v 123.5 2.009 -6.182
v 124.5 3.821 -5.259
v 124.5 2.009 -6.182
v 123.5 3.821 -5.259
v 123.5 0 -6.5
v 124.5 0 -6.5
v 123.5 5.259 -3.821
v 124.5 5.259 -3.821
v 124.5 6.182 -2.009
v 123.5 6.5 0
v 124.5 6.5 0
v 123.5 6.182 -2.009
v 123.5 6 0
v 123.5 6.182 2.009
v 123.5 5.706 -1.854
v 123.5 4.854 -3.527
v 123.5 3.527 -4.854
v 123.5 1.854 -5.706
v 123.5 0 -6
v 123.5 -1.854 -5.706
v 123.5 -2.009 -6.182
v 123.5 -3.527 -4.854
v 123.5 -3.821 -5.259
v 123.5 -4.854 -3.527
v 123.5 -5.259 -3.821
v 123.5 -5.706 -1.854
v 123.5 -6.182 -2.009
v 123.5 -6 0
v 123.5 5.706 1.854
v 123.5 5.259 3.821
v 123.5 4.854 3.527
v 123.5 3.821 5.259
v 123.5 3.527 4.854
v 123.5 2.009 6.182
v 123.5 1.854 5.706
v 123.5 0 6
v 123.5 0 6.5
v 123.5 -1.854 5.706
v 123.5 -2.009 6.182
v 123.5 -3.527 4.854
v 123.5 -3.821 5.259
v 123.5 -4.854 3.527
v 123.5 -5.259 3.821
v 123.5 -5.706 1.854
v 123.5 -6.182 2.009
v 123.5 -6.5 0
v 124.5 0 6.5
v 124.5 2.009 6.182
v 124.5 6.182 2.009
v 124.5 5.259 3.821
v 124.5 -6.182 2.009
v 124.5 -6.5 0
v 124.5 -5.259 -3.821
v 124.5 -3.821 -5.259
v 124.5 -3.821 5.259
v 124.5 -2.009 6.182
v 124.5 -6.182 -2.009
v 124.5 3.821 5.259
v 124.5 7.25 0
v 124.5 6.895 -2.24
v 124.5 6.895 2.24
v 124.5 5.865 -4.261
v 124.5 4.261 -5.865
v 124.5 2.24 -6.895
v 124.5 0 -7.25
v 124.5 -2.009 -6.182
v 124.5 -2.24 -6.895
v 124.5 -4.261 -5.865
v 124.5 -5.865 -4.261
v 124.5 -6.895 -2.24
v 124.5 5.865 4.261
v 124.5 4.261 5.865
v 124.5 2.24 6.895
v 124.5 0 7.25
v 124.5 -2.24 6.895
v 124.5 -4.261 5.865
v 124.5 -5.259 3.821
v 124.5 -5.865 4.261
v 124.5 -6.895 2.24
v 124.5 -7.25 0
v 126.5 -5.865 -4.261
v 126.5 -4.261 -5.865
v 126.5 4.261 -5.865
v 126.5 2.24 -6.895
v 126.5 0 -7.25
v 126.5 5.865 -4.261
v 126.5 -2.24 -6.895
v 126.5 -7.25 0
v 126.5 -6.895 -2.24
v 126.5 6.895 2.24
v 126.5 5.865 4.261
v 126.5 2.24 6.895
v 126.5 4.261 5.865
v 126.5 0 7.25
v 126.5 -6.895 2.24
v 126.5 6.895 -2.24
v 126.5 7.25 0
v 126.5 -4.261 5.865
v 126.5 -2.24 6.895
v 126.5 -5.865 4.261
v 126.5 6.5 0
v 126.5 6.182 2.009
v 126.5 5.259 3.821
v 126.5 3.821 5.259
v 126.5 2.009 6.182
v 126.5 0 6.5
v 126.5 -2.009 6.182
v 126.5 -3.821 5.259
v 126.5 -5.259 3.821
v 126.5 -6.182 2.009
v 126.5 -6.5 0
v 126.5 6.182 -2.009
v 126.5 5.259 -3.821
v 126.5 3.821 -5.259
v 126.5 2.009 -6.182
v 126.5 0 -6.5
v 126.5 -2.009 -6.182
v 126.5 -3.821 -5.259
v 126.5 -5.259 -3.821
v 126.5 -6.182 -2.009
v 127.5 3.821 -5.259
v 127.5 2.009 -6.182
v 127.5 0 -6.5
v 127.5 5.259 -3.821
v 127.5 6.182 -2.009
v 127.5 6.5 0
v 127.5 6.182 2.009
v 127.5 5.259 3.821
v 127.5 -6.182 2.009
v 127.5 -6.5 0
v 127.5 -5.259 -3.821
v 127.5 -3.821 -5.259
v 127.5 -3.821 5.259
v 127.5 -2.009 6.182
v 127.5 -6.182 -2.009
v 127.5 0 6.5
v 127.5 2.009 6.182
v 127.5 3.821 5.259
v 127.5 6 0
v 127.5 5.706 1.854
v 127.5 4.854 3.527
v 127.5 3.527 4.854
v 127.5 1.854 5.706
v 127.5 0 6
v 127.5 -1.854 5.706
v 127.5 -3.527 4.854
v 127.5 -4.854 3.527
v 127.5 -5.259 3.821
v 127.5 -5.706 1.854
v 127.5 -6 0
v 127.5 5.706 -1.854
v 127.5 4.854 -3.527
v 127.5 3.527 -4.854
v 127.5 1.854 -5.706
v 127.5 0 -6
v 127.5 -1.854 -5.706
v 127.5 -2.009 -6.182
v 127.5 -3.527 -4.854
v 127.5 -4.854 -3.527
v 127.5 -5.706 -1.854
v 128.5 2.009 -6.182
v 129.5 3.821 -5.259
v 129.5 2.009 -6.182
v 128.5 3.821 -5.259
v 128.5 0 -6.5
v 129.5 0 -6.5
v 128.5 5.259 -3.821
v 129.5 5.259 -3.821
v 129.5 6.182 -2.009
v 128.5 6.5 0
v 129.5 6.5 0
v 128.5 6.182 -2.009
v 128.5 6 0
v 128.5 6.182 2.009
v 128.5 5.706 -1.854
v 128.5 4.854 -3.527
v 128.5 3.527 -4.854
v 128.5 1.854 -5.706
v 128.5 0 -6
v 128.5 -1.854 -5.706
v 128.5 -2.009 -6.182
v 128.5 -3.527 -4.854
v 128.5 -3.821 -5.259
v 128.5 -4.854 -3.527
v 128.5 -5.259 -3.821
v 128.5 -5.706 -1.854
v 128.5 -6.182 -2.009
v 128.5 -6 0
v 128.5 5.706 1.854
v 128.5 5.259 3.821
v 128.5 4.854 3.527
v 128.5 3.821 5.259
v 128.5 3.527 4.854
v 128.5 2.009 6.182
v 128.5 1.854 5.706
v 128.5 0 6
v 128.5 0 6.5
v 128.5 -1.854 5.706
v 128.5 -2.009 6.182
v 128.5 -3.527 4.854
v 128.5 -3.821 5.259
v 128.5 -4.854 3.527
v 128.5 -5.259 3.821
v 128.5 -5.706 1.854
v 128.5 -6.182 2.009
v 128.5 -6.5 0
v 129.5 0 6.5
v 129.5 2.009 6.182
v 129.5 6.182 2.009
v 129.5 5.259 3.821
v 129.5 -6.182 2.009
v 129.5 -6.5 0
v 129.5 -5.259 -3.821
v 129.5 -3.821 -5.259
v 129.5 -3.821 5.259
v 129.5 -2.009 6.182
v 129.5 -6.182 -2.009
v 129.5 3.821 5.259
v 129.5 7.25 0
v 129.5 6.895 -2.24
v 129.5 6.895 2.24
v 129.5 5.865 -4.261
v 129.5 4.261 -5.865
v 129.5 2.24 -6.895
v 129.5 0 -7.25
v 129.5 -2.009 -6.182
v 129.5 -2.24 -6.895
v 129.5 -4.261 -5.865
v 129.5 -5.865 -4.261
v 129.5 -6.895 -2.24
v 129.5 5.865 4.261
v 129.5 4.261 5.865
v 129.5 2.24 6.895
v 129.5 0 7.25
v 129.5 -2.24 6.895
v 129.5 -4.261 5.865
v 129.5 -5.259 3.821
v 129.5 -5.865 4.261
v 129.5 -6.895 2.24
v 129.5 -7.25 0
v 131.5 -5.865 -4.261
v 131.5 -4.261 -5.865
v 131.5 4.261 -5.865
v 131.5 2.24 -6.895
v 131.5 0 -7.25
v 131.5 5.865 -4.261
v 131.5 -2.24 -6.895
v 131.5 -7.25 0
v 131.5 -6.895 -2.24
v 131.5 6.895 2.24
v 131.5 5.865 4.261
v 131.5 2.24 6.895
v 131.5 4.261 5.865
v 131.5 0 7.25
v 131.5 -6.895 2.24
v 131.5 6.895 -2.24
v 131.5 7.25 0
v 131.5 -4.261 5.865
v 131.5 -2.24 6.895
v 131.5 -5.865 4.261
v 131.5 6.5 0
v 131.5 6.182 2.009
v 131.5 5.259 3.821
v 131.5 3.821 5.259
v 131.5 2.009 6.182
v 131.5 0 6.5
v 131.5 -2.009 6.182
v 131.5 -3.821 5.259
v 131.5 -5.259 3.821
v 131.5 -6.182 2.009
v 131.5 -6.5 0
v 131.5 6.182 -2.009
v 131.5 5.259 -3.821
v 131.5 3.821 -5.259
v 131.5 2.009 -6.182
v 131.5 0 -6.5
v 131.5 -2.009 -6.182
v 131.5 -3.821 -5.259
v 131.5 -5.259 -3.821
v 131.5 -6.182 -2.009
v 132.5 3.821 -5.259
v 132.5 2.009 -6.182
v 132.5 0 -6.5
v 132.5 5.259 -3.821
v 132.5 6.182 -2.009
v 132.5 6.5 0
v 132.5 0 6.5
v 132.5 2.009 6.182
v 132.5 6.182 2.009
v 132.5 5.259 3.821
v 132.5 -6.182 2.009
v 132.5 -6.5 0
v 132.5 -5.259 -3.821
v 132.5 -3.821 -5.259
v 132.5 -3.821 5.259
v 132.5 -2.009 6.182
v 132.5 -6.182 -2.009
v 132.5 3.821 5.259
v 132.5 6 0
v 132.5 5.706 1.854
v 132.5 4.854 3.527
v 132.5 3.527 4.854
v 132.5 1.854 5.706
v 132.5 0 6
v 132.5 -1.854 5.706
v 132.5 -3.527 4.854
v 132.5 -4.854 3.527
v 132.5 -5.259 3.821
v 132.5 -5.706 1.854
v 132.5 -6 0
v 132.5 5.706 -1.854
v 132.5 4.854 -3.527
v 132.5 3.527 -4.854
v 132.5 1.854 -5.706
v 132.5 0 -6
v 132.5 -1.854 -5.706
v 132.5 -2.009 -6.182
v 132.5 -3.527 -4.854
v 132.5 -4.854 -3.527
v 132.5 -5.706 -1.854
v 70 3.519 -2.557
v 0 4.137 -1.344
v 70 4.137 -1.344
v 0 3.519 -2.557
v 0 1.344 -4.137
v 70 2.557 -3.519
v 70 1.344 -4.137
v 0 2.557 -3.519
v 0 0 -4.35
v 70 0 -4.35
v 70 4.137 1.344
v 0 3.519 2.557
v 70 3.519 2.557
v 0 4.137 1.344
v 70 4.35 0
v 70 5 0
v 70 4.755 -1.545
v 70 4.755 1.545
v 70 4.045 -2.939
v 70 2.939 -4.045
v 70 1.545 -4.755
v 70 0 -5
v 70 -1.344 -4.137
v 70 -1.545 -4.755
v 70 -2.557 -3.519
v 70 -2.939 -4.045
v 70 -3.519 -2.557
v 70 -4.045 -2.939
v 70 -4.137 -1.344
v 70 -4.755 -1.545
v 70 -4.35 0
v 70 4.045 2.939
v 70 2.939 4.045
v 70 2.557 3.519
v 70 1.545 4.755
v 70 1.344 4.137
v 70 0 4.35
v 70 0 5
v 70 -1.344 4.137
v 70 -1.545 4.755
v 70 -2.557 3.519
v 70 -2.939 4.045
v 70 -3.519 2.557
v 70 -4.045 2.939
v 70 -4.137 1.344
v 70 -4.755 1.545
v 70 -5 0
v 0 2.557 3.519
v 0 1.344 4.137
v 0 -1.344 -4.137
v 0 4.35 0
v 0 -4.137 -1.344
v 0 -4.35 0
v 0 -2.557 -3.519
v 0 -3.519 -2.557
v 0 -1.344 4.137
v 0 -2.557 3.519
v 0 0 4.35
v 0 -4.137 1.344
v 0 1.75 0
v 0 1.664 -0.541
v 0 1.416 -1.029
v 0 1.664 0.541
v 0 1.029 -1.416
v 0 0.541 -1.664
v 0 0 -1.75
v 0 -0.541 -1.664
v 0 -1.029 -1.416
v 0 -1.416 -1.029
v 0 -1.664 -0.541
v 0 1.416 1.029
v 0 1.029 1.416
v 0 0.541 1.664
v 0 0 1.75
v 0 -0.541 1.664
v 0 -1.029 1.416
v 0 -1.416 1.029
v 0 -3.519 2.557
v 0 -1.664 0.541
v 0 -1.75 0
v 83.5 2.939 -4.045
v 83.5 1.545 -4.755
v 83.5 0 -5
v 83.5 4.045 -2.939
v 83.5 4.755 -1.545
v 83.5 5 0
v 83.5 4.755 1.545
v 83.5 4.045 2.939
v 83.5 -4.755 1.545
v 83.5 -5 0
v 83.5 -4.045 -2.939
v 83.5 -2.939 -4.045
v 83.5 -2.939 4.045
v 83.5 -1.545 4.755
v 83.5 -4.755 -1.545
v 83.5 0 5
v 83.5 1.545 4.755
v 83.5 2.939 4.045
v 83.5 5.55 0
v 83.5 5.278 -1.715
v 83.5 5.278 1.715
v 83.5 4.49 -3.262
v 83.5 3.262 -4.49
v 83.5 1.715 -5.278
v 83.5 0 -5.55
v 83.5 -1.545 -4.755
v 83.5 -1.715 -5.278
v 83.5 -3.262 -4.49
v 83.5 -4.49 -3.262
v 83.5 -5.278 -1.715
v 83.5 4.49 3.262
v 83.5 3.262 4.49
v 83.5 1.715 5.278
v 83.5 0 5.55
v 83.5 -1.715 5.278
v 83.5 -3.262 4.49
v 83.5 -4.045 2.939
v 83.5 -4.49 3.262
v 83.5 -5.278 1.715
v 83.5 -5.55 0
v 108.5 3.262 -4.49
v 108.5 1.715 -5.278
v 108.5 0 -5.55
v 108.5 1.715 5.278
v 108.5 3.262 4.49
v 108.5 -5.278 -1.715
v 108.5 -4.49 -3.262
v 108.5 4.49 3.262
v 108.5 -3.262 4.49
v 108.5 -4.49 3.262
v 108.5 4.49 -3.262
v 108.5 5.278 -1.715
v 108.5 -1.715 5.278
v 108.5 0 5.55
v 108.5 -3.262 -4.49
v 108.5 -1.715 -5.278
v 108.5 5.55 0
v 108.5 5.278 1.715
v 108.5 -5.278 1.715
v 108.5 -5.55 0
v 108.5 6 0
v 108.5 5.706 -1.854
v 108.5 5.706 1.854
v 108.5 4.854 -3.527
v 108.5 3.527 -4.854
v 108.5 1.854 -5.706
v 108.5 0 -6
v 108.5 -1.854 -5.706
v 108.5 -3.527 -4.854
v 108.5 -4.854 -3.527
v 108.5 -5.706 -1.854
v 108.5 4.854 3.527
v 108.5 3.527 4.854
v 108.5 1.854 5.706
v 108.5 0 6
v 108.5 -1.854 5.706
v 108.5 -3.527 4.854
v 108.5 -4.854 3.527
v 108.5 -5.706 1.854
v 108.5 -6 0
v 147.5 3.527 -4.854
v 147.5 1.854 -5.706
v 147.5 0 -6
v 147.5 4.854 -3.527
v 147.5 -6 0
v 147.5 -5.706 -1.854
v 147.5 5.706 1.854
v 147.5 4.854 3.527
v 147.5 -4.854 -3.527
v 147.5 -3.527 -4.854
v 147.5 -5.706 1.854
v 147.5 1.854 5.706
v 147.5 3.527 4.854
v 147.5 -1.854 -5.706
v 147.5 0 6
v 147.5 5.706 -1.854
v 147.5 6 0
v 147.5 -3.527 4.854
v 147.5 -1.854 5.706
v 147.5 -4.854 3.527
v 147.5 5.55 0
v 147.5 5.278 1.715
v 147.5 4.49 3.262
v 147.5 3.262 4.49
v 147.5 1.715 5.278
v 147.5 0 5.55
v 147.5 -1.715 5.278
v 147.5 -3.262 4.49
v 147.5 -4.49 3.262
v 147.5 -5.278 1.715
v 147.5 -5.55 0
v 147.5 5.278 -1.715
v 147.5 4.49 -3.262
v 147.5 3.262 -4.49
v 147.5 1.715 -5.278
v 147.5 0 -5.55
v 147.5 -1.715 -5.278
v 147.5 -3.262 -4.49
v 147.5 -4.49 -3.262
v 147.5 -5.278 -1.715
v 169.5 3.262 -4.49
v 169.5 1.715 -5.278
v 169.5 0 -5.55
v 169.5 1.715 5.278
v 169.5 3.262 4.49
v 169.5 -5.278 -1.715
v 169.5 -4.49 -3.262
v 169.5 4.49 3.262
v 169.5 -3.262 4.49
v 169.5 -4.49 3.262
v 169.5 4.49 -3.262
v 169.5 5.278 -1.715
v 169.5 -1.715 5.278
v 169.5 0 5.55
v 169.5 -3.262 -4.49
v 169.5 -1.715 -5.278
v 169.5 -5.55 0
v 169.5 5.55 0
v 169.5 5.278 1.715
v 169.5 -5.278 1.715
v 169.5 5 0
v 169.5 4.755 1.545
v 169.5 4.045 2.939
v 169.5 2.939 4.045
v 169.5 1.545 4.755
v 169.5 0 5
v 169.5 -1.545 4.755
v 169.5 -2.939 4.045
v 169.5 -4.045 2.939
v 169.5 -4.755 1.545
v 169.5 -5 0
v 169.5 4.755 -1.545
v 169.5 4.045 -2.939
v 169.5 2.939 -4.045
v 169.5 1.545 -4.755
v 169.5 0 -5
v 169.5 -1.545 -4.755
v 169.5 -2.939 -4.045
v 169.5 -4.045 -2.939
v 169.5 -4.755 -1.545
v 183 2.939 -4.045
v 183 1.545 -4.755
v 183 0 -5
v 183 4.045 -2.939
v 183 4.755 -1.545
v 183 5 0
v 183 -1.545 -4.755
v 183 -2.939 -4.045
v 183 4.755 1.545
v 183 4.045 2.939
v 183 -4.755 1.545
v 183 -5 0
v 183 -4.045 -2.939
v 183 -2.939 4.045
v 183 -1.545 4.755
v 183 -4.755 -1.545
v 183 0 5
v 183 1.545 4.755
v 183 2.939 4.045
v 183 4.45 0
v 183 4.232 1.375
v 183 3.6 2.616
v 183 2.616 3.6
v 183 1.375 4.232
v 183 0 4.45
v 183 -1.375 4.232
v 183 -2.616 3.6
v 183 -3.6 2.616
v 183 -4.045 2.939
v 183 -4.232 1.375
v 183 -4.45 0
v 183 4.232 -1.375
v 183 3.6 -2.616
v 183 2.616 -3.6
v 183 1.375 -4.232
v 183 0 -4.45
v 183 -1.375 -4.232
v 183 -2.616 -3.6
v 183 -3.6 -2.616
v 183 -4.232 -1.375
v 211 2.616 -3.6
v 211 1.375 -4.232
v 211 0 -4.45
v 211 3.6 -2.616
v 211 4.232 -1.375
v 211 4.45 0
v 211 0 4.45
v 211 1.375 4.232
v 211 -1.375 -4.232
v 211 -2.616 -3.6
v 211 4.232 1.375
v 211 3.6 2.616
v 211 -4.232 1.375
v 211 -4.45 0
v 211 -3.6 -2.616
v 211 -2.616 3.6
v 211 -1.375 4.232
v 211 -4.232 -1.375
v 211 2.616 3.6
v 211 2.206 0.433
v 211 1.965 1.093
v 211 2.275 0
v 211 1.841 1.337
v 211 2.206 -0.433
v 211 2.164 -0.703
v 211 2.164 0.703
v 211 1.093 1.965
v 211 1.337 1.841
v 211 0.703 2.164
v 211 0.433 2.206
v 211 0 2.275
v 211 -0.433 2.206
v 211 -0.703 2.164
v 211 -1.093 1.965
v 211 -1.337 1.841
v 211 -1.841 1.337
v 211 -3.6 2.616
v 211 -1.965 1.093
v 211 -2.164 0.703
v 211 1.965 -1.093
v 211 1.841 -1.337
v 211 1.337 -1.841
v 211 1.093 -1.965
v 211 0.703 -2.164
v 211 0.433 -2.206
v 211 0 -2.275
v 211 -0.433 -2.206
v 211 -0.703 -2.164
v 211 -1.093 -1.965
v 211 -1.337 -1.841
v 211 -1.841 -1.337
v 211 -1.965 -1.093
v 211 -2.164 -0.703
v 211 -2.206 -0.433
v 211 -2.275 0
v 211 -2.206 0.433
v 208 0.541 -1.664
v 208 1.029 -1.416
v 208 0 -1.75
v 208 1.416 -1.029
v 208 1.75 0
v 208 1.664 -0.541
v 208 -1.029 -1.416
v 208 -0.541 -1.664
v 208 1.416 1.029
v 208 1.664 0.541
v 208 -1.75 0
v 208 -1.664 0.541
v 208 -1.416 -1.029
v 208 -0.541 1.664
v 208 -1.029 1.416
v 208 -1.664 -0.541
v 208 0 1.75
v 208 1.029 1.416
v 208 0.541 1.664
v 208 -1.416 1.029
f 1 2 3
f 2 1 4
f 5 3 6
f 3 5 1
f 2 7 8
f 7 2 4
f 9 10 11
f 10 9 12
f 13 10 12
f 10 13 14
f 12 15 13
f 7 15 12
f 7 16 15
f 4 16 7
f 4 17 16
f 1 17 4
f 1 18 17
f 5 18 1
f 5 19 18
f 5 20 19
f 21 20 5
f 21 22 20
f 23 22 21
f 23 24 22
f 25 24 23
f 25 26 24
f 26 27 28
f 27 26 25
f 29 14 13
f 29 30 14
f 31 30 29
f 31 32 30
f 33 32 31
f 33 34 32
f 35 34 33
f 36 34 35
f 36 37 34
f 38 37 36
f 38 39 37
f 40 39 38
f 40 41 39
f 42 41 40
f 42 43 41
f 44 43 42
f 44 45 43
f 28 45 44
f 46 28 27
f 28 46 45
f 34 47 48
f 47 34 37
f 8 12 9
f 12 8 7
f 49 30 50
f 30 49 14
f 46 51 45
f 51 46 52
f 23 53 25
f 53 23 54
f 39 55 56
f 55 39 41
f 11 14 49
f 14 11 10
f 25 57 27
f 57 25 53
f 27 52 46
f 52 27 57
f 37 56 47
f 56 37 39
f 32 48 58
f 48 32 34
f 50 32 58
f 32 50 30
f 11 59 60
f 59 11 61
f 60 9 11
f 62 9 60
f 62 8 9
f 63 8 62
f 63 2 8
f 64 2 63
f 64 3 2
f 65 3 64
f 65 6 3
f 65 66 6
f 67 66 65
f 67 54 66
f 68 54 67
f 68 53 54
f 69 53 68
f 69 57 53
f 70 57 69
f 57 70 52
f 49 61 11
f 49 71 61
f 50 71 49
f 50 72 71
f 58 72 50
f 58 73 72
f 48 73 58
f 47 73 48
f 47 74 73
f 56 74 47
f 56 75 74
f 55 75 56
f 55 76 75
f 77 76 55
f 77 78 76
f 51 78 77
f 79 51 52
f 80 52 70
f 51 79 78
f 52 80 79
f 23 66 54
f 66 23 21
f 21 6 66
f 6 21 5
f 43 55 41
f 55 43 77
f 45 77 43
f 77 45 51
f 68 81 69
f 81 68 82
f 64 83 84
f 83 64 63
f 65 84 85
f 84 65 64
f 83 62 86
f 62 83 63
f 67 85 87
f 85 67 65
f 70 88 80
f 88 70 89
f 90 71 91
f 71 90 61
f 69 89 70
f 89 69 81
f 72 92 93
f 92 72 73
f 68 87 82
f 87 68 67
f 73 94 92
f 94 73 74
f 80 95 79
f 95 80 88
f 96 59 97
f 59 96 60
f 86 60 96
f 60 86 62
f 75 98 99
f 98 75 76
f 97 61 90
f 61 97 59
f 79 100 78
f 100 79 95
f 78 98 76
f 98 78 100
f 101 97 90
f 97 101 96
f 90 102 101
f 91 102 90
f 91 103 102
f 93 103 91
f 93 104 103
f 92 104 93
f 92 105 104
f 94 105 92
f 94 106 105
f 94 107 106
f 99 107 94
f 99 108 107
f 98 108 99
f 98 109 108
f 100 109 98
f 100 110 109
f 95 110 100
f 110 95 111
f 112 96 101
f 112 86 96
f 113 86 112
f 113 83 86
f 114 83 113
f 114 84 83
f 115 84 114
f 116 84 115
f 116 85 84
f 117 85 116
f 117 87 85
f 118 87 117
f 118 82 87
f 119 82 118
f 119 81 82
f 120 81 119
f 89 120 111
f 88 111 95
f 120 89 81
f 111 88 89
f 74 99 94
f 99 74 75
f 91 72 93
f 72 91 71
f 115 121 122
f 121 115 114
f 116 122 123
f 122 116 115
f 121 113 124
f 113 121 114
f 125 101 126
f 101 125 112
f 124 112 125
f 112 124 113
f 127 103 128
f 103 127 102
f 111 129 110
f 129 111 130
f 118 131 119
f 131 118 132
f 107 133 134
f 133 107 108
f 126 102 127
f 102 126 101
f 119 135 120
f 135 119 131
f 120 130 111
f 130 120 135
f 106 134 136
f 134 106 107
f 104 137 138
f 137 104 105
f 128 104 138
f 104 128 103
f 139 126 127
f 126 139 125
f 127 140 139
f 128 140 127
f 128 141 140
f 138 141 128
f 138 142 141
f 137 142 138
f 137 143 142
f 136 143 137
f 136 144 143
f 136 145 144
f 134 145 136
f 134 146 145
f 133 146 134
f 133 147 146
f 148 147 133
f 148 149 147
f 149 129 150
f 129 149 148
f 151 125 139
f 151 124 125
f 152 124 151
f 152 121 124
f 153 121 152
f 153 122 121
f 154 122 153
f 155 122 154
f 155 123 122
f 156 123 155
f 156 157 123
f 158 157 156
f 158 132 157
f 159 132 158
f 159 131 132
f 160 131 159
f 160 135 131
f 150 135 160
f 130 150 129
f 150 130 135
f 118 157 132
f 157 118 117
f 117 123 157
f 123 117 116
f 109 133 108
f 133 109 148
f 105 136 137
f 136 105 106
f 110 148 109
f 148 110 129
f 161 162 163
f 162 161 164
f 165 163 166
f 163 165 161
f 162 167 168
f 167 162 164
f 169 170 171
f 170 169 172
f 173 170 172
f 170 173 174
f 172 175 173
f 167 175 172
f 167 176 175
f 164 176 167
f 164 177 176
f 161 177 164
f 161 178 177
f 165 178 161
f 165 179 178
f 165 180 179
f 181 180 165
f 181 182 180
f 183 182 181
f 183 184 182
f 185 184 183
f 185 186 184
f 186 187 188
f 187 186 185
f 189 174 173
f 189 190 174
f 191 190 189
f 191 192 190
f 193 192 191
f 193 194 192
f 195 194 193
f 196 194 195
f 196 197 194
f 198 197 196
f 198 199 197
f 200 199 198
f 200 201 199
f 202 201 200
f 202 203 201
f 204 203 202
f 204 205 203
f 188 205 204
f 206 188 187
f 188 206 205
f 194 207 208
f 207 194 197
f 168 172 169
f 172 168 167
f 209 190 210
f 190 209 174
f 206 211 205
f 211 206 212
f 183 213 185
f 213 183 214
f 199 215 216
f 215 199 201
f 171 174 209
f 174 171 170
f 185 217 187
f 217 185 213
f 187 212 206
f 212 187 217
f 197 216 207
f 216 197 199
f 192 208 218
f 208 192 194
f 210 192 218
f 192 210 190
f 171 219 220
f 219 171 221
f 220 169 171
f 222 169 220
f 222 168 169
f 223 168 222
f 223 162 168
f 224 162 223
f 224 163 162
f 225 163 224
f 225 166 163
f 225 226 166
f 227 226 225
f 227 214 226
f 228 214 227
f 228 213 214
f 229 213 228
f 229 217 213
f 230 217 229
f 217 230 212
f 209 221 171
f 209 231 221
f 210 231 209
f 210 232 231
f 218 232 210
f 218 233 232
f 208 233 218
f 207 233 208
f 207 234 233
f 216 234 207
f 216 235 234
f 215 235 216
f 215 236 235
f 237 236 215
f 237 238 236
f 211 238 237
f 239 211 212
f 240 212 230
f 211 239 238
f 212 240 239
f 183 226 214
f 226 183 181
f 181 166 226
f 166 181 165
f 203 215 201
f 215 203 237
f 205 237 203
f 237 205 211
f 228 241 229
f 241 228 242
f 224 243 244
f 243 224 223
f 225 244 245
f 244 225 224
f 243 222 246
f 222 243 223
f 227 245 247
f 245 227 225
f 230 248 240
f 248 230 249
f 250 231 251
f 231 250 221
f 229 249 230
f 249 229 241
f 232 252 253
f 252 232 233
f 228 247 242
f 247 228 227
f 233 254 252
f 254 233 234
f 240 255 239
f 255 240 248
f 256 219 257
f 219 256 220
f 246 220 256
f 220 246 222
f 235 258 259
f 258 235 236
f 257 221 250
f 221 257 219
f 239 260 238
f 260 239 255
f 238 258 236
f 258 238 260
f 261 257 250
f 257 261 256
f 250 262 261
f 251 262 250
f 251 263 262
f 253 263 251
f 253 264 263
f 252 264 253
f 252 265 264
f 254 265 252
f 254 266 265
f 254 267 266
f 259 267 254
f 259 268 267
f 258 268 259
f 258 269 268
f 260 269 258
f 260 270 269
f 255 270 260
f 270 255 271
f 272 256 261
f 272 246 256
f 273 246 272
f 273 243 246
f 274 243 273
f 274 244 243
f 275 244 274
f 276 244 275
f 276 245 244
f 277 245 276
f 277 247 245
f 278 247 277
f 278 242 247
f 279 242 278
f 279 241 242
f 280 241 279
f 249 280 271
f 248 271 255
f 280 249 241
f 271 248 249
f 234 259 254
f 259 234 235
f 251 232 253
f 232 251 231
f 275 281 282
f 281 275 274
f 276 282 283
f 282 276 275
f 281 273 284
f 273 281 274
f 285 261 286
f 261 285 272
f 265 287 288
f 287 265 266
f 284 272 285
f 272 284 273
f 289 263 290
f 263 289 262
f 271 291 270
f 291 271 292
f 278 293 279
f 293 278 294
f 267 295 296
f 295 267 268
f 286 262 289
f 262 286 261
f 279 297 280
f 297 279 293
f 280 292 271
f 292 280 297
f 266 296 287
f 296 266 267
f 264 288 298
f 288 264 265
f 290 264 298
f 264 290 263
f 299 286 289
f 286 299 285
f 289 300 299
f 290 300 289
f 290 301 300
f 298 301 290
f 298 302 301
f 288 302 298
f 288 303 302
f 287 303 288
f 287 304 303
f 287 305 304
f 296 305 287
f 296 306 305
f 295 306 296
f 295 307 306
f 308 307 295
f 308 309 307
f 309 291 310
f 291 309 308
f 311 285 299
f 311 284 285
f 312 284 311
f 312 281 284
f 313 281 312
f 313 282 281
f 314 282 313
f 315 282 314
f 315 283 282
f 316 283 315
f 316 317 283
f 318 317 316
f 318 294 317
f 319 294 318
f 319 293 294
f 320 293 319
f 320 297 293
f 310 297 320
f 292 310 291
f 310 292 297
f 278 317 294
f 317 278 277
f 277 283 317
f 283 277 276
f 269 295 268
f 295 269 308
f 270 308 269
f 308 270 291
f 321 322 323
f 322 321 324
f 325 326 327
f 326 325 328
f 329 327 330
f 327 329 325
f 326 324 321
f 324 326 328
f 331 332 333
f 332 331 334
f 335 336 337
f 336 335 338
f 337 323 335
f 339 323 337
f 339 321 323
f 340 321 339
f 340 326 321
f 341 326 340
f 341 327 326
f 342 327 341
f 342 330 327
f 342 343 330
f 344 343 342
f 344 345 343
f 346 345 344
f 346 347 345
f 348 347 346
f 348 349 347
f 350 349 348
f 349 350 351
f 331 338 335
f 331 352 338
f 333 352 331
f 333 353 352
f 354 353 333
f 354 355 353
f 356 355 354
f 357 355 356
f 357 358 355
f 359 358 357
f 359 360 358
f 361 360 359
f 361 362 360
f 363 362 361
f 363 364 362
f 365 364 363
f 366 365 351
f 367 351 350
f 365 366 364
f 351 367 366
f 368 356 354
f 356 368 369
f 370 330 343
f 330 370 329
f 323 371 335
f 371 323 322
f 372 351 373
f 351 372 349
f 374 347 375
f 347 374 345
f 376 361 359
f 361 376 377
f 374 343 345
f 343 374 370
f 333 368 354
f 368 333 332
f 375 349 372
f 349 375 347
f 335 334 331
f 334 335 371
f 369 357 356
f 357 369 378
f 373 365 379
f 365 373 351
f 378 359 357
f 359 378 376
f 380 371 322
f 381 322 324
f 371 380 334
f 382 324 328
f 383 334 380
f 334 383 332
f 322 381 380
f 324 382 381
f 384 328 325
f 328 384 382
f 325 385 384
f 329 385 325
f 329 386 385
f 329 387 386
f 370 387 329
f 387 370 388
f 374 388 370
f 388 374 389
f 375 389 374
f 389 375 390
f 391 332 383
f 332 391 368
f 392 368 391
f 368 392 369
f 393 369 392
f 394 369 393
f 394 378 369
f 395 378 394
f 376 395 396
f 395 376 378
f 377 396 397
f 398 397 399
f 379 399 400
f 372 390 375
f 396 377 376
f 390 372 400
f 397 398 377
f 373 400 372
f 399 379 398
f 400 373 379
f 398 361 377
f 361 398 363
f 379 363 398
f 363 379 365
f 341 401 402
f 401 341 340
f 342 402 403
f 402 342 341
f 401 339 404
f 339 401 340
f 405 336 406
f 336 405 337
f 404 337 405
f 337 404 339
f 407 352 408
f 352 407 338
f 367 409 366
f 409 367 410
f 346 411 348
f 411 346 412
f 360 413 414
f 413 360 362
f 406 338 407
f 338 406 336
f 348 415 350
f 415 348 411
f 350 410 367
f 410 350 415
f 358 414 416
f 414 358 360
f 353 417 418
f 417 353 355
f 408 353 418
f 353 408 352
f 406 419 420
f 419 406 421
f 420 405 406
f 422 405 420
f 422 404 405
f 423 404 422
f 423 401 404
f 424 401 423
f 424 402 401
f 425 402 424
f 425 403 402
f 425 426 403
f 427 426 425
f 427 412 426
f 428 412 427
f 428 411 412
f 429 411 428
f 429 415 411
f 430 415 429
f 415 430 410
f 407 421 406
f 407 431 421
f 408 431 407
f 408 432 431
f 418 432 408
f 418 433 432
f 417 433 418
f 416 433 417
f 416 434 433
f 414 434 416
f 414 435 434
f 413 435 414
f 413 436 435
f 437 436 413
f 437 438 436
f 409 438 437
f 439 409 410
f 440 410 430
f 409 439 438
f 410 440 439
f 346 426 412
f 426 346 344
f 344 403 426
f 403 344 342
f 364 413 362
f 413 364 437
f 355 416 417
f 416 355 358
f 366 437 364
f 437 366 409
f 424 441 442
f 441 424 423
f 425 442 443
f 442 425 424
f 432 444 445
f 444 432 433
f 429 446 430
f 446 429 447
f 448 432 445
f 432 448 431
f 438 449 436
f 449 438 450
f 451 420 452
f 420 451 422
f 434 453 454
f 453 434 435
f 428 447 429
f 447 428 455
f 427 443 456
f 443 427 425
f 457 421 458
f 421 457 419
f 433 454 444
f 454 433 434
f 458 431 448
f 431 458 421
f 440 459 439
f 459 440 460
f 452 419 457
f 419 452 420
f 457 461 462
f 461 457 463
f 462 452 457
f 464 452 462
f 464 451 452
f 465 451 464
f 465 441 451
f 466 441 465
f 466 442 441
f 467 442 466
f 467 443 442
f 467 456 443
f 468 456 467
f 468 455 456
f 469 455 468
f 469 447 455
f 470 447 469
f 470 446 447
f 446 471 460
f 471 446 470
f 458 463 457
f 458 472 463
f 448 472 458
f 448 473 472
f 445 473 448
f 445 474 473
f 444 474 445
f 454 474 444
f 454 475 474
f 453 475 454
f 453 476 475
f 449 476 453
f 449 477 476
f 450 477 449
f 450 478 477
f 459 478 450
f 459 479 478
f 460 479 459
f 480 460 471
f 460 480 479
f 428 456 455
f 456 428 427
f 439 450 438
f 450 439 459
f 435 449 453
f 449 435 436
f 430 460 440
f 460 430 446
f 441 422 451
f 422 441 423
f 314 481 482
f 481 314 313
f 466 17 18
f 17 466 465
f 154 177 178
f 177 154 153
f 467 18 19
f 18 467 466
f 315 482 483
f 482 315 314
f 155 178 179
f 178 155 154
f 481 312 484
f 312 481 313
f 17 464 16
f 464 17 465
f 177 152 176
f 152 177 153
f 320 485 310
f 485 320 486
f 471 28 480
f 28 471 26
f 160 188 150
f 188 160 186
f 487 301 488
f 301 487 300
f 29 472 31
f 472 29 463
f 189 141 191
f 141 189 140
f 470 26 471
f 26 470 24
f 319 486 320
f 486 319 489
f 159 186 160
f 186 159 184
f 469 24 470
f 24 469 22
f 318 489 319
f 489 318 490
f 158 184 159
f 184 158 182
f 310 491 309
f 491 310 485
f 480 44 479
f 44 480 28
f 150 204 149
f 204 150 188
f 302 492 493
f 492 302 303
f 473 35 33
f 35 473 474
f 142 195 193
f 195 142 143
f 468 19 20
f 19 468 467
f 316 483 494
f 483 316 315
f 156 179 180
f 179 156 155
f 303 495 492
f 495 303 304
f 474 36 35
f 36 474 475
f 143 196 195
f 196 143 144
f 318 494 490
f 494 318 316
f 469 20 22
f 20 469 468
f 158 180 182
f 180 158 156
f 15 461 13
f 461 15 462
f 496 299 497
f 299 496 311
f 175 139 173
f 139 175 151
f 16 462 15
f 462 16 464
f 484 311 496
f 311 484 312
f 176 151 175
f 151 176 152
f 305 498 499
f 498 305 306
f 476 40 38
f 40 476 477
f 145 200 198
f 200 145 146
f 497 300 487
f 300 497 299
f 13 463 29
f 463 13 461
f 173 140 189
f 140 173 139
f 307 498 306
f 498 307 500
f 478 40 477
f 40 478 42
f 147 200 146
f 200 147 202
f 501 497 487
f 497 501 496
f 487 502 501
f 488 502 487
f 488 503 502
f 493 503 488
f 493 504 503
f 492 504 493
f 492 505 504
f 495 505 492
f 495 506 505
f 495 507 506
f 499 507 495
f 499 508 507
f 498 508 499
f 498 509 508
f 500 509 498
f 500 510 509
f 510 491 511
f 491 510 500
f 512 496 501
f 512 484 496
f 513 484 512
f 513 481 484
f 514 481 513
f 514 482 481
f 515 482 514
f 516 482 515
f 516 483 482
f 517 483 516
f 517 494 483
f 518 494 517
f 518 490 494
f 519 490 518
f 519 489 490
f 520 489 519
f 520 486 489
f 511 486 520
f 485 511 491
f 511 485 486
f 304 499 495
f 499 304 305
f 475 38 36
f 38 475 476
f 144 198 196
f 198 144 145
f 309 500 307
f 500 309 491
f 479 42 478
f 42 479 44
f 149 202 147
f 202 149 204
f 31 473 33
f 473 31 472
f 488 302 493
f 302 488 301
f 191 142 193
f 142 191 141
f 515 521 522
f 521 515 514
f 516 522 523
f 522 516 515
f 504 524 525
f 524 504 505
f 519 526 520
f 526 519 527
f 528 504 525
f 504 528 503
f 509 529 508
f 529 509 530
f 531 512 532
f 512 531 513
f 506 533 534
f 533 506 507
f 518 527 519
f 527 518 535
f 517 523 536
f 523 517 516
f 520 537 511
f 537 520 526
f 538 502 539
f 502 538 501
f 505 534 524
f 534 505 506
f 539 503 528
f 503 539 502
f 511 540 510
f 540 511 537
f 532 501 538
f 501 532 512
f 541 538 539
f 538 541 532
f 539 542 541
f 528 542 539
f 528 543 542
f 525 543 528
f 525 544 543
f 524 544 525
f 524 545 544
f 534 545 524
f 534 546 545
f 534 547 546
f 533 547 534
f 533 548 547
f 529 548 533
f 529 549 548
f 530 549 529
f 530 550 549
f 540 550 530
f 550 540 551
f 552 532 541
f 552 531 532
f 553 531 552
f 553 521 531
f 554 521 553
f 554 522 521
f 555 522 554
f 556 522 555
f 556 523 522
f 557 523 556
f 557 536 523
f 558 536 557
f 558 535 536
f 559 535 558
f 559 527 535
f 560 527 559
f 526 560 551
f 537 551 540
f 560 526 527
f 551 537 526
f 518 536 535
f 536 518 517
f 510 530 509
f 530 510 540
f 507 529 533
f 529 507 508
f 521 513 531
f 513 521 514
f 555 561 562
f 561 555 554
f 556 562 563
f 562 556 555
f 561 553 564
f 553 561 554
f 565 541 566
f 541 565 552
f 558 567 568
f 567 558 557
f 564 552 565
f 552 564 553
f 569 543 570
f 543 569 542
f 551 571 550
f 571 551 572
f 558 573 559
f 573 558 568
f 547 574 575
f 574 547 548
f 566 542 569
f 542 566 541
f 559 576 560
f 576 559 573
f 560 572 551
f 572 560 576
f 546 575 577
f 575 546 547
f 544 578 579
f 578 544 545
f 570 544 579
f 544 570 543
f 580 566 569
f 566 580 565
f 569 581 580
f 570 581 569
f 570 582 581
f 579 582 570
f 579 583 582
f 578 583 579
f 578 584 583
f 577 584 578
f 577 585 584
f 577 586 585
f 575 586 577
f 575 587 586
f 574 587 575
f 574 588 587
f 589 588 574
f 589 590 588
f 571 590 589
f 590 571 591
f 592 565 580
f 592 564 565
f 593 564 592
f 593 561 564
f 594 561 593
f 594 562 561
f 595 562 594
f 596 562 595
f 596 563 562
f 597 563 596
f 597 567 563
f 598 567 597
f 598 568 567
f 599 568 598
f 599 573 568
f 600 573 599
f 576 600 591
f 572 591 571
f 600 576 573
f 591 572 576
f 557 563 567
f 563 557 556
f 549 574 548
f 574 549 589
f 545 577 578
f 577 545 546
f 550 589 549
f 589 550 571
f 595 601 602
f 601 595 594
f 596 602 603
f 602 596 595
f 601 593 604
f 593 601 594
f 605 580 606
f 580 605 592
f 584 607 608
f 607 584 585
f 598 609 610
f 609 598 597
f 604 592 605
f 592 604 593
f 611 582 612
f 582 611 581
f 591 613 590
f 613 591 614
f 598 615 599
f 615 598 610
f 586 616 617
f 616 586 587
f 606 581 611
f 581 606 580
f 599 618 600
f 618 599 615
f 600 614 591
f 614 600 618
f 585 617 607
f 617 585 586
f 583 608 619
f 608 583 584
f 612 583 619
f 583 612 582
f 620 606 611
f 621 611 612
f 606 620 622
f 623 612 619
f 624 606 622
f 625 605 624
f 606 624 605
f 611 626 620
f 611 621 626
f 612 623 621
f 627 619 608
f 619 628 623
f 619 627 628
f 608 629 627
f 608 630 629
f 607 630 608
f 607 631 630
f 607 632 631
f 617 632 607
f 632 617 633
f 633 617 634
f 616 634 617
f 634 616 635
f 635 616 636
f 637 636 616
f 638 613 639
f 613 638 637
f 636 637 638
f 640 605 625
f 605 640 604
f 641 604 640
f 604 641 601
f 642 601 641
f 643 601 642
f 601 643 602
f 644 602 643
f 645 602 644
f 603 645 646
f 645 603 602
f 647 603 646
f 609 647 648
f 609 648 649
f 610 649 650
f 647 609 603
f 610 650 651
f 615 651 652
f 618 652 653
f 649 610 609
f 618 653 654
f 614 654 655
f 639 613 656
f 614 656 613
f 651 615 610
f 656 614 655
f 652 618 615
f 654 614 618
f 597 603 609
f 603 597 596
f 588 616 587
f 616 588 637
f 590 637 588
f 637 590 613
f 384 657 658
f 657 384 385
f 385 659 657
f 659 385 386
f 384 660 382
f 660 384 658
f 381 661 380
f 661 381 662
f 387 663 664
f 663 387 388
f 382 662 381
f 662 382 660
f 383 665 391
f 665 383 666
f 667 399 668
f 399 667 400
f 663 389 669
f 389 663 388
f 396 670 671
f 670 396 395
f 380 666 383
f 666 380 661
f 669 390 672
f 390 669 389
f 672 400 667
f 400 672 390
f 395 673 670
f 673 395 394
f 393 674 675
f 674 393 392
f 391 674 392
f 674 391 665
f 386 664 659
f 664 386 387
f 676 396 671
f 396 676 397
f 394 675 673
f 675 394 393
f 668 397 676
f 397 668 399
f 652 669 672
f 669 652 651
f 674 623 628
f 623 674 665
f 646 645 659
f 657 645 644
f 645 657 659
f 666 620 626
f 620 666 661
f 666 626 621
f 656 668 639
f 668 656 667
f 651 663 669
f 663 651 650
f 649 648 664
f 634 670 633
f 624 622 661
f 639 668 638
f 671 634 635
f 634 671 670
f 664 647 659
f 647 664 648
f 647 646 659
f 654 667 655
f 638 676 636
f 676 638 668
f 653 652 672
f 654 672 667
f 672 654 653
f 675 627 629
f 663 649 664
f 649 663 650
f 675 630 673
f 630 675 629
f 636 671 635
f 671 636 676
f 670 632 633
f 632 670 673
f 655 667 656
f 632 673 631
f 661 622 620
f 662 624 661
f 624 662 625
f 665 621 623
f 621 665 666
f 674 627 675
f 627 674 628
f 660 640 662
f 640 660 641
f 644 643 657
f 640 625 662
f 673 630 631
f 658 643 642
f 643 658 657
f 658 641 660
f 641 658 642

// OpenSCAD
// openNSP_project, drone stand section version 1.0
// Zexuan Qiao, 2024
// under GPL license ver3

droneStandLOA = 214.0; //.1
turningPin = 70.0; //.1
turningPinDiameter = 8.7; //.1
topMountWood = 13.5; //.1
topMountWoodDiameter = 10; //.1
topFerruleWood = 25; //.1
topFerruleWoodDiameter = 11.1; //.1

mainWooden = 39.0; //.1
mainWoodenDiameter = 12.0; //.1

decoration1 = 1; //.1
decoration2 = 2.0; //.1
decoration3 = 1.0; //.1
gap = 1.0; //.1
decoration4 = 1.0; //.1
decoration5 = 2.0; //.1
decoration6 = 1.0; //.1

decoration1Diameter = 13.0; //.1
decoration2Diameter = 14.5; //.1
decoration3Diameter = 13.0; //.1
decoration4Diameter = 13.0; //.1
decoration5Diameter = 14.5; //.1
decoration6Diameter = 13.0; //.1

bottomFerruleWood = 22; //.1
bottomFerruleWoodDiameter = 11.1; //.1

bottomMountWood = 13.5; //.1
bottomMountWoodDiameter = 10; //.1

tenon = 28; //.1
tenonDiameter = 8.9; //.1

mainBore = 3.5; //.1

reedSocket = 6; //.1
reedSocketDiameter = 5.6; //.1

/* [Utilities] */
// Segments, the higher the value, the smoother the surface would be.
$fn = 20;


rotate([0, 90, 0]) {
  difference() {
    union() {
    cylinder(h = turningPin, d = turningPinDiameter);
    translate([0,0,turningPin]) cylinder(h = topMountWood, d = topMountWoodDiameter);
    translate([0,0,turningPin+topMountWood]) cylinder(h = topFerruleWood, d = topFerruleWoodDiameter);
    translate([0,0,turningPin+topMountWood+topFerruleWood]) cylinder(h = mainWooden, d = mainWoodenDiameter);
    translate([0,0,turningPin+topMountWood+topFerruleWood+mainWooden]) cylinder(h = bottomFerruleWood, d = bottomFerruleWoodDiameter);
    translate([0,0,turningPin+topMountWood+topFerruleWood+mainWooden+bottomFerruleWood]) cylinder(h = bottomMountWood, d = bottomMountWoodDiameter);
    translate([0,0,turningPin+topMountWood+topFerruleWood+mainWooden+bottomFerruleWood+ bottomMountWood]) cylinder(h = tenon, d = tenonDiameter);
    
     translate([0,0,turningPin+topMountWood+topFerruleWood+mainWooden/2]) union() {
    translate([0,0,-decoration1-decoration2-decoration3-gap/2 ]) cylinder(h = decoration1, d = decoration1Diameter);
      translate([0,0,-decoration2-decoration3-gap/2 ]) cylinder(h = decoration2, d = decoration2Diameter);
      translate([0,0,-decoration3-gap/2 ]) cylinder(h = decoration3, d = decoration3Diameter);
    translate([0,0,+gap/2 ]) cylinder(h = decoration4, d = decoration4Diameter); 
    translate([0,0,decoration4+gap/2 ]) cylinder(h = decoration5, d = decoration5Diameter);
       translate([0,0,decoration4+decoration5+gap/2 ]) cylinder(h = decoration6, d = decoration6Diameter);
    }
    
    }
    cylinder(h = droneStandLOA, d = mainBore);
    translate([0,0,droneStandLOA-reedSocket])    cylinder(h = reedSocket, d1 = mainBore, d2 =reedSocketDiameter);
  }
}
